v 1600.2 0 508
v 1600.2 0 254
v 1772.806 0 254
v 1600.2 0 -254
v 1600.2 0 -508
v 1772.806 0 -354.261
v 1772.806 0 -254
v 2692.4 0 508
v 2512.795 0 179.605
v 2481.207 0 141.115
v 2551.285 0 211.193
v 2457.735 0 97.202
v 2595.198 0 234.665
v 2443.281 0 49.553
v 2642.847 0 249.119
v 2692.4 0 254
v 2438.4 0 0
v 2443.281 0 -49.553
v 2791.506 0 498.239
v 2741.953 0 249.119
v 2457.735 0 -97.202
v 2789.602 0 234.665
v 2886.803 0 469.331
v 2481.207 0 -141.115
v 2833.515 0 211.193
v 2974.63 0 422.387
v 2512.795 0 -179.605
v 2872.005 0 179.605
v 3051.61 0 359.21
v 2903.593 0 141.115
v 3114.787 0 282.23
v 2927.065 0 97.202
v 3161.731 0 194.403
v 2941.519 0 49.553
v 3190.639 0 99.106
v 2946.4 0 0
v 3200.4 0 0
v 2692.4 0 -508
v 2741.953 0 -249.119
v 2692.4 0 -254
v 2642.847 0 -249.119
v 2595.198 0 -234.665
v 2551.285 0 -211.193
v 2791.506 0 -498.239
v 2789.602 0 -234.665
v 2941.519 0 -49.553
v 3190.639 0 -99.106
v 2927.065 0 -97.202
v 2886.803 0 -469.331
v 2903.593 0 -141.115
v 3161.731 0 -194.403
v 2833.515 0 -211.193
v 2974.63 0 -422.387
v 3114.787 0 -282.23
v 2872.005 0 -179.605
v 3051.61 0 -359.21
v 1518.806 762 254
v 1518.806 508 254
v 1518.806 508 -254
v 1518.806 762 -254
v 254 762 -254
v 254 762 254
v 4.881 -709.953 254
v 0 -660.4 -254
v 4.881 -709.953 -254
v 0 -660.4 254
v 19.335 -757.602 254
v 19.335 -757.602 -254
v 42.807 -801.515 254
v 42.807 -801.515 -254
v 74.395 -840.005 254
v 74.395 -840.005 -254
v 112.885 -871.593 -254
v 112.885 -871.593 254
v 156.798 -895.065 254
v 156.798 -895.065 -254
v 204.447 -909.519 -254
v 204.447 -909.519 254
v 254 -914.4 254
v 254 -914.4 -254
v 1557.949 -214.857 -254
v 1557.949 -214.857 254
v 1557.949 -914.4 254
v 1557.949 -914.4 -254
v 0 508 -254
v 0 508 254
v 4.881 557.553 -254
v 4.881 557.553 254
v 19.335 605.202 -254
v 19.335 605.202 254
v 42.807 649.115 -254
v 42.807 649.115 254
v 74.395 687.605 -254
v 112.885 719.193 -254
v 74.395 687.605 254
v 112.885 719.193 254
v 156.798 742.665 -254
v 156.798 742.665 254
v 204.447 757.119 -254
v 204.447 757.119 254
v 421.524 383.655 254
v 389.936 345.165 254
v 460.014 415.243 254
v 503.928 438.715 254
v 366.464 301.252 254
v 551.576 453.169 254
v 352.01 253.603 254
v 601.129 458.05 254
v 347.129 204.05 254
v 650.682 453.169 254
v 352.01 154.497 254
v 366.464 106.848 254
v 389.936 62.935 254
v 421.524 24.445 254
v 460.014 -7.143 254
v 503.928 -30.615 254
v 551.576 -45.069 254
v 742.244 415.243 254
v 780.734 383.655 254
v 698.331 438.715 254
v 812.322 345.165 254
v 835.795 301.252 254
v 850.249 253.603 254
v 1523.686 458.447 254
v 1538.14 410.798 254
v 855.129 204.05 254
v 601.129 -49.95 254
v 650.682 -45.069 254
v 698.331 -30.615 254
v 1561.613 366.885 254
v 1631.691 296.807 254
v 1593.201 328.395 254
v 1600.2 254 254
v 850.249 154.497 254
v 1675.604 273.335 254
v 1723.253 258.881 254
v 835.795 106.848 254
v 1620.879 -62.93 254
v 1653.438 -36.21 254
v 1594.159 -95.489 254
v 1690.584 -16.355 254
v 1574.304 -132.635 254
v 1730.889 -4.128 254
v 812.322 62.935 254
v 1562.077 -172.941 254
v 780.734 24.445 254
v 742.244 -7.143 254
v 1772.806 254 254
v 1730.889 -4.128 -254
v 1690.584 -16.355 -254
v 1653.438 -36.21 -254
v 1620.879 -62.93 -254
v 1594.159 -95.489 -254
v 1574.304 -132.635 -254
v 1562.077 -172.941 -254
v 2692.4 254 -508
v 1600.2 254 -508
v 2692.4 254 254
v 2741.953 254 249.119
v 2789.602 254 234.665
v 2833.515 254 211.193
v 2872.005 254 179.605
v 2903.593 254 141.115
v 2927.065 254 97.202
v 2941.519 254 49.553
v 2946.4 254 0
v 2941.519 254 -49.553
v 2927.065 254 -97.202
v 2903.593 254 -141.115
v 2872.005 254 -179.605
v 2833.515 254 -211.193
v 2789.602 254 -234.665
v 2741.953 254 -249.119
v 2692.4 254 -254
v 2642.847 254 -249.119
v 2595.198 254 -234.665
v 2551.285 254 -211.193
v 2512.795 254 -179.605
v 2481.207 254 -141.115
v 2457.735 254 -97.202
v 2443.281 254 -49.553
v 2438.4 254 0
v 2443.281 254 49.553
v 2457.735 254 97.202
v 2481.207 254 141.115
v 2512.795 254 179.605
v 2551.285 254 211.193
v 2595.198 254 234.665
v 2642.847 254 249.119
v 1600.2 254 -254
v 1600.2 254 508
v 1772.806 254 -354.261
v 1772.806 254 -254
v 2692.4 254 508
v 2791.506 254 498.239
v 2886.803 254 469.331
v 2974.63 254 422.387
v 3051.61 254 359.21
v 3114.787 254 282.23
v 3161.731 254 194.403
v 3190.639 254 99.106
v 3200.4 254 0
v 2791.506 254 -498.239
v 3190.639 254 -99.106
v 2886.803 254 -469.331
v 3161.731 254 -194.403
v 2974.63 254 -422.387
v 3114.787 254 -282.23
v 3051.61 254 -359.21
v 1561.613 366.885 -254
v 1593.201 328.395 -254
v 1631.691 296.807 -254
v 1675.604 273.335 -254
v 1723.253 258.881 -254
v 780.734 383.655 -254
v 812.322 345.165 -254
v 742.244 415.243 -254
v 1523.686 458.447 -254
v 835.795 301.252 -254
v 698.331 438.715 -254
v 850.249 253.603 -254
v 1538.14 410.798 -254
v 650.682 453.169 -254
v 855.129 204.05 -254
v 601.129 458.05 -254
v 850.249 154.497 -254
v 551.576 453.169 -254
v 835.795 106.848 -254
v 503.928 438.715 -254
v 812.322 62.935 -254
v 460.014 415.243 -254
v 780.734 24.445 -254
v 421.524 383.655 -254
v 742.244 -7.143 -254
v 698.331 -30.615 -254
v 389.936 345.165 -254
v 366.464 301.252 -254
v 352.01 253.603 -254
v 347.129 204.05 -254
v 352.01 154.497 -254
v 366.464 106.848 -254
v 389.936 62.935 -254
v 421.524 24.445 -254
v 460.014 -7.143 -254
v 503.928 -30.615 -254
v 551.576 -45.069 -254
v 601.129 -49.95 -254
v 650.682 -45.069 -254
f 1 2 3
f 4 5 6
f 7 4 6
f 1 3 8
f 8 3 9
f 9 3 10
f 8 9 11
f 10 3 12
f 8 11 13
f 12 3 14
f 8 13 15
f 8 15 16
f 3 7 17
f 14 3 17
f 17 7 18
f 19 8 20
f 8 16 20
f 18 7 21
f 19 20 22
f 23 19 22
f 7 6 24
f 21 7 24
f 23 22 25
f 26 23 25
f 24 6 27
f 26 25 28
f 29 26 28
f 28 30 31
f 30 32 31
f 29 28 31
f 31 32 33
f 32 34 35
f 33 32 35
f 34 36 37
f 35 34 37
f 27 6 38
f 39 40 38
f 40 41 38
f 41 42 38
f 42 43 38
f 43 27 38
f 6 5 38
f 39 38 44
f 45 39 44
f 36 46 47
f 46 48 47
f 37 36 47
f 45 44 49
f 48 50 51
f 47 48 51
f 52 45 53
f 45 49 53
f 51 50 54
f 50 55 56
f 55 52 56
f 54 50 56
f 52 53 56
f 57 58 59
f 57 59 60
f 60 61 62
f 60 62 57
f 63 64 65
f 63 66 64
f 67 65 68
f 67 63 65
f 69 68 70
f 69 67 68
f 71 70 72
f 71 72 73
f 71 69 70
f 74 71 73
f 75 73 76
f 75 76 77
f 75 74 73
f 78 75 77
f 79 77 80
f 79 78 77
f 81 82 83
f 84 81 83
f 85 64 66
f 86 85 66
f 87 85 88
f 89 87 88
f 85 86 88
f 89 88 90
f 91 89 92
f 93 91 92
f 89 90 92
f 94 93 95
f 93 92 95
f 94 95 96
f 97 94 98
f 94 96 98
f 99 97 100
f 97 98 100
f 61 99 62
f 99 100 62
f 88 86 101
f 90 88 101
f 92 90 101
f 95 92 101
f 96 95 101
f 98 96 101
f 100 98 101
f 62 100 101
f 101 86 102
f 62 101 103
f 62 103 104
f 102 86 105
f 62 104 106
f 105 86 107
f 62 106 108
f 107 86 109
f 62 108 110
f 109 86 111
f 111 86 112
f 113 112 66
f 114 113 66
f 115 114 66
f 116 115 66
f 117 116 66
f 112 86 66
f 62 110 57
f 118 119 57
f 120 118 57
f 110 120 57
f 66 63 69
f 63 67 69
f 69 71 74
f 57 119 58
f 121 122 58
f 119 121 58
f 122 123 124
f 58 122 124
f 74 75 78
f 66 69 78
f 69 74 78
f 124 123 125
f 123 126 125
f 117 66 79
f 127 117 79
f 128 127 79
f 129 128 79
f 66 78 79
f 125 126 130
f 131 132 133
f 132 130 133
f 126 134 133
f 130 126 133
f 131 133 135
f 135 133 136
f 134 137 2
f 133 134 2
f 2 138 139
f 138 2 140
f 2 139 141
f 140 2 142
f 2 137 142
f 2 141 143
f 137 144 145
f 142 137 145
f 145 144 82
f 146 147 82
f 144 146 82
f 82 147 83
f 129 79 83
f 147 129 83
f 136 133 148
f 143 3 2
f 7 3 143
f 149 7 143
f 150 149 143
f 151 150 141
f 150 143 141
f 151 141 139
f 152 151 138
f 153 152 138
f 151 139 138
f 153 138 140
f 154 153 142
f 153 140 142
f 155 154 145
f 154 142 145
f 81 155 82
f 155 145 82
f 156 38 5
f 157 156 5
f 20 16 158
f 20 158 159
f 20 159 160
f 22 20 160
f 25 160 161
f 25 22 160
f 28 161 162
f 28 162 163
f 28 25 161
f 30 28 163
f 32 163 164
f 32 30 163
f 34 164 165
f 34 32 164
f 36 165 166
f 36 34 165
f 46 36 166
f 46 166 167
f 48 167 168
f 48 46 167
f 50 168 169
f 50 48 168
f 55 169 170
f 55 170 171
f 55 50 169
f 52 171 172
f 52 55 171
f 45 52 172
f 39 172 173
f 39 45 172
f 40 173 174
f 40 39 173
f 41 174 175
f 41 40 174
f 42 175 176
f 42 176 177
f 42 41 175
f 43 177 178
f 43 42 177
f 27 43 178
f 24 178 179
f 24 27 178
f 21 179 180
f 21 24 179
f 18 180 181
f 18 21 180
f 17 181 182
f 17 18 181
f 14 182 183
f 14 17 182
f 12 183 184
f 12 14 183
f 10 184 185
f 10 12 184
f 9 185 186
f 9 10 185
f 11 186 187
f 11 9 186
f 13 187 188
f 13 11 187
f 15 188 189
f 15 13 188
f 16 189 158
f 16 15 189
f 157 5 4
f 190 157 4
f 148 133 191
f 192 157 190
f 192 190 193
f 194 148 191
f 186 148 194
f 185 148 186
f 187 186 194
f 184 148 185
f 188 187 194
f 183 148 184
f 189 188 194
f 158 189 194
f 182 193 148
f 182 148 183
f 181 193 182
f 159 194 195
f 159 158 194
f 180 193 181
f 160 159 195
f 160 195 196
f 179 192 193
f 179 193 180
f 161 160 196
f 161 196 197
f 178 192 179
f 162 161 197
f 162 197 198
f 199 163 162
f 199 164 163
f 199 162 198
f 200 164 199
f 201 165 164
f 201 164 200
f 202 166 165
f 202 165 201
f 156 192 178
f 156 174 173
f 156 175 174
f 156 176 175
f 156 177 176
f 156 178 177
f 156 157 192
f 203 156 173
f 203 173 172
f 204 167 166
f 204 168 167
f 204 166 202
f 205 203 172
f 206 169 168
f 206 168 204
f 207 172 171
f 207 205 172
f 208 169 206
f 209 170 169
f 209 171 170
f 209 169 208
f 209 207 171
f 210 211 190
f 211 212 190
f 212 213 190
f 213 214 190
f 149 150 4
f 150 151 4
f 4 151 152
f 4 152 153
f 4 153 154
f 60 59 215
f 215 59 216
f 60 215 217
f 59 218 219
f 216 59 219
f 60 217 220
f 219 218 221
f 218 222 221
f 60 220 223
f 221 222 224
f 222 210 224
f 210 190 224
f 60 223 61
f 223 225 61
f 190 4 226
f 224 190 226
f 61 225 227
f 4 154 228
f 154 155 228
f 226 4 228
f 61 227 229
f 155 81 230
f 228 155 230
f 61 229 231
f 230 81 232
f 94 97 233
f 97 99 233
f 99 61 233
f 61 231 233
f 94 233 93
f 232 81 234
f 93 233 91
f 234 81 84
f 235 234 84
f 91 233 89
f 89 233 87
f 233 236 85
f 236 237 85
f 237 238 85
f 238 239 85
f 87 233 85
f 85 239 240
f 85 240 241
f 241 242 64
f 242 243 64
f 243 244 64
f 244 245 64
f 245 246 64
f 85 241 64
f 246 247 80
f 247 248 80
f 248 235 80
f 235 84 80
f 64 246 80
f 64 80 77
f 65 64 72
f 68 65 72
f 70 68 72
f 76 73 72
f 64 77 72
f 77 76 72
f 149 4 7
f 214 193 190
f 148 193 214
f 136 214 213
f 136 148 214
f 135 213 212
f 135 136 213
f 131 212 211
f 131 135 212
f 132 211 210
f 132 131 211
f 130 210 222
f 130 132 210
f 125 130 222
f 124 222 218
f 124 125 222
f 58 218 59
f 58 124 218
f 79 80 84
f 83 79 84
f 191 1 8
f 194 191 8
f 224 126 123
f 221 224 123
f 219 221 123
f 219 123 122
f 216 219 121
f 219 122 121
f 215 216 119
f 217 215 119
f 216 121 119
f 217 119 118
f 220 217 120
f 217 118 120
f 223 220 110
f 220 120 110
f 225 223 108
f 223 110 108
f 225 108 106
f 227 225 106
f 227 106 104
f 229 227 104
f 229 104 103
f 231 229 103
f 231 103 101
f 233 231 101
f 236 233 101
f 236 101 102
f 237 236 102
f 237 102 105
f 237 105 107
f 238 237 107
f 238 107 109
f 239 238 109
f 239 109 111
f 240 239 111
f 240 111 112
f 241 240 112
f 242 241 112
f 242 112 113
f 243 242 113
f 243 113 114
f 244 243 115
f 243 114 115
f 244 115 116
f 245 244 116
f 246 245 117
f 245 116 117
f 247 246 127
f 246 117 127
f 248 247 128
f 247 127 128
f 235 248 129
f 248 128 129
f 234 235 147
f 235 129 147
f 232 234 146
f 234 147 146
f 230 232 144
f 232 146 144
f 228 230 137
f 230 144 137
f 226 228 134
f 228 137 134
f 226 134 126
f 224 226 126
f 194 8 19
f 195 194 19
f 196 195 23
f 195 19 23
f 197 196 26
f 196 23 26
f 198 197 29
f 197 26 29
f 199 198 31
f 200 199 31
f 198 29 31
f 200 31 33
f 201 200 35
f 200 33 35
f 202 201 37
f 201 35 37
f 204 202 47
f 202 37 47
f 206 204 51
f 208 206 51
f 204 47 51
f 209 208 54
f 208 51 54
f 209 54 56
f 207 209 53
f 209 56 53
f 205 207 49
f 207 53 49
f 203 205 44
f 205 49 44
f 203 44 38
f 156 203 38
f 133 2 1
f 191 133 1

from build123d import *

# Parameters (mm, degrees)
BOSS_EXTRUDE1_DEPTH      = 508
BOSS_EXTRUDE1_DEPTH_BACK = 914.4
SKETCH1_W                = 1772.805842697
SKETCH1_H                = 508
SKETCH1_3_R              = 254
BOSS_EXTRUDE2_DEPTH      = 254
SKETCH1_4_W              = 1772.805842697
SKETCH1_4_H              = 508
BOSS_EXTRUDE3_DEPTH      = 762
CUT_EXTRUDE1_DEPTH       = 608.260771289
FILLET2_R                = 254
FILLET3_R                = 254
SKETCH12_R               = 254
CUT_EXTRUDE2_DEPTH       = 614.68


with BuildPart() as part:
    # Sketch1 → Boss-Extrude1 (new, two sides: drawn at the far end of the back side and taken through both)
    with BuildSketch(Plane(origin=(0, 0, 0), x_dir=(1, 0, 0), z_dir=(0, 1, 0)).offset(-BOSS_EXTRUDE1_DEPTH_BACK)):
        with Locations((886.402921349, 0)):
            Rectangle(SKETCH1_W, SKETCH1_H)
    extrude(amount=BOSS_EXTRUDE1_DEPTH + BOSS_EXTRUDE1_DEPTH_BACK)

    # Sketch1<3> → Boss-Extrude2 (add)
    with BuildSketch(Plane(origin=(0, 0, 0), x_dir=(1, 0, 0), z_dir=(0, 1, 0))):
        with BuildLine():
            Line((1772.805842697, -254), (1600.2, -254))
            Line((1600.2, -254), (1600.2, -508))
            Line((1600.2, -508), (2692.4, -508))
            ThreePointArc((2692.4, -508), (3200.4, 0), (2692.4, 508))
            Line((2692.4, 508), (1600.2, 508))
            Line((1600.2, 508), (1600.2, 254))
            Line((1600.2, 254), (1772.805842697, 254))
            Line((1772.805842697, 254), (1772.805842697, -254))
        make_face()
        with Locations((2692.4, 0)):
            Circle(SKETCH1_3_R, mode=Mode.SUBTRACT)
    extrude(amount=BOSS_EXTRUDE2_DEPTH)

    # Sketch1<4> → Boss-Extrude3 (add)
    with BuildSketch(Plane(origin=(0, 0, 0), x_dir=(1, 0, 0), z_dir=(0, 1, 0))):
        with Locations((886.402921349, 0)):
            Rectangle(SKETCH1_4_W, SKETCH1_4_H)
    extrude(amount=BOSS_EXTRUDE3_DEPTH)

    # Sketch11 → Cut-Extrude1 (cut)
    with BuildSketch(Plane.XY.offset(254)):
        with BuildLine():
            Line((1518.805842697, 508), (1518.805842697, 762))
            Line((1518.805842697, 762), (1772.805842697, 762))
            Line((1772.805842697, 762), (1772.805842697, 254))
            ThreePointArc((1772.805842697, 254), (1593.200720275, 328.394877579), (1518.805842697, 508))
        make_face()
        with BuildLine():
            Line((1557.94858799, -214.857254707), (1557.94858799, -914.4))
            Line((1557.94858799, -914.4), (1772.805842697, -914.4))
            Line((1772.805842697, -914.4), (1772.805842697, 0))
            ThreePointArc((1772.805842697, 0), (1620.878820906, -62.930232917), (1557.94858799, -214.857254707))
        make_face()
    extrude(amount=-CUT_EXTRUDE1_DEPTH, mode=Mode.SUBTRACT)

    # Fillet2
    fillet2_edges = [part.edges().sort_by_distance(p)[0] for p in [
        (0, 762, 0),
    ]]
    fillet(fillet2_edges, radius=FILLET2_R)

    # Fillet3
    fillet3_edges = [part.edges().sort_by_distance(p)[0] for p in [
        (0, -914.4, 0),
    ]]
    fillet(fillet3_edges, radius=FILLET3_R)

    # Sketch12 → Cut-Extrude2 (cut)
    with BuildSketch(Plane.XY.offset(254)):
        with Locations((601.129209232, 204.050012336)):
            Circle(SKETCH12_R)
    extrude(amount=-CUT_EXTRUDE2_DEPTH, mode=Mode.SUBTRACT)


solid = part.part
